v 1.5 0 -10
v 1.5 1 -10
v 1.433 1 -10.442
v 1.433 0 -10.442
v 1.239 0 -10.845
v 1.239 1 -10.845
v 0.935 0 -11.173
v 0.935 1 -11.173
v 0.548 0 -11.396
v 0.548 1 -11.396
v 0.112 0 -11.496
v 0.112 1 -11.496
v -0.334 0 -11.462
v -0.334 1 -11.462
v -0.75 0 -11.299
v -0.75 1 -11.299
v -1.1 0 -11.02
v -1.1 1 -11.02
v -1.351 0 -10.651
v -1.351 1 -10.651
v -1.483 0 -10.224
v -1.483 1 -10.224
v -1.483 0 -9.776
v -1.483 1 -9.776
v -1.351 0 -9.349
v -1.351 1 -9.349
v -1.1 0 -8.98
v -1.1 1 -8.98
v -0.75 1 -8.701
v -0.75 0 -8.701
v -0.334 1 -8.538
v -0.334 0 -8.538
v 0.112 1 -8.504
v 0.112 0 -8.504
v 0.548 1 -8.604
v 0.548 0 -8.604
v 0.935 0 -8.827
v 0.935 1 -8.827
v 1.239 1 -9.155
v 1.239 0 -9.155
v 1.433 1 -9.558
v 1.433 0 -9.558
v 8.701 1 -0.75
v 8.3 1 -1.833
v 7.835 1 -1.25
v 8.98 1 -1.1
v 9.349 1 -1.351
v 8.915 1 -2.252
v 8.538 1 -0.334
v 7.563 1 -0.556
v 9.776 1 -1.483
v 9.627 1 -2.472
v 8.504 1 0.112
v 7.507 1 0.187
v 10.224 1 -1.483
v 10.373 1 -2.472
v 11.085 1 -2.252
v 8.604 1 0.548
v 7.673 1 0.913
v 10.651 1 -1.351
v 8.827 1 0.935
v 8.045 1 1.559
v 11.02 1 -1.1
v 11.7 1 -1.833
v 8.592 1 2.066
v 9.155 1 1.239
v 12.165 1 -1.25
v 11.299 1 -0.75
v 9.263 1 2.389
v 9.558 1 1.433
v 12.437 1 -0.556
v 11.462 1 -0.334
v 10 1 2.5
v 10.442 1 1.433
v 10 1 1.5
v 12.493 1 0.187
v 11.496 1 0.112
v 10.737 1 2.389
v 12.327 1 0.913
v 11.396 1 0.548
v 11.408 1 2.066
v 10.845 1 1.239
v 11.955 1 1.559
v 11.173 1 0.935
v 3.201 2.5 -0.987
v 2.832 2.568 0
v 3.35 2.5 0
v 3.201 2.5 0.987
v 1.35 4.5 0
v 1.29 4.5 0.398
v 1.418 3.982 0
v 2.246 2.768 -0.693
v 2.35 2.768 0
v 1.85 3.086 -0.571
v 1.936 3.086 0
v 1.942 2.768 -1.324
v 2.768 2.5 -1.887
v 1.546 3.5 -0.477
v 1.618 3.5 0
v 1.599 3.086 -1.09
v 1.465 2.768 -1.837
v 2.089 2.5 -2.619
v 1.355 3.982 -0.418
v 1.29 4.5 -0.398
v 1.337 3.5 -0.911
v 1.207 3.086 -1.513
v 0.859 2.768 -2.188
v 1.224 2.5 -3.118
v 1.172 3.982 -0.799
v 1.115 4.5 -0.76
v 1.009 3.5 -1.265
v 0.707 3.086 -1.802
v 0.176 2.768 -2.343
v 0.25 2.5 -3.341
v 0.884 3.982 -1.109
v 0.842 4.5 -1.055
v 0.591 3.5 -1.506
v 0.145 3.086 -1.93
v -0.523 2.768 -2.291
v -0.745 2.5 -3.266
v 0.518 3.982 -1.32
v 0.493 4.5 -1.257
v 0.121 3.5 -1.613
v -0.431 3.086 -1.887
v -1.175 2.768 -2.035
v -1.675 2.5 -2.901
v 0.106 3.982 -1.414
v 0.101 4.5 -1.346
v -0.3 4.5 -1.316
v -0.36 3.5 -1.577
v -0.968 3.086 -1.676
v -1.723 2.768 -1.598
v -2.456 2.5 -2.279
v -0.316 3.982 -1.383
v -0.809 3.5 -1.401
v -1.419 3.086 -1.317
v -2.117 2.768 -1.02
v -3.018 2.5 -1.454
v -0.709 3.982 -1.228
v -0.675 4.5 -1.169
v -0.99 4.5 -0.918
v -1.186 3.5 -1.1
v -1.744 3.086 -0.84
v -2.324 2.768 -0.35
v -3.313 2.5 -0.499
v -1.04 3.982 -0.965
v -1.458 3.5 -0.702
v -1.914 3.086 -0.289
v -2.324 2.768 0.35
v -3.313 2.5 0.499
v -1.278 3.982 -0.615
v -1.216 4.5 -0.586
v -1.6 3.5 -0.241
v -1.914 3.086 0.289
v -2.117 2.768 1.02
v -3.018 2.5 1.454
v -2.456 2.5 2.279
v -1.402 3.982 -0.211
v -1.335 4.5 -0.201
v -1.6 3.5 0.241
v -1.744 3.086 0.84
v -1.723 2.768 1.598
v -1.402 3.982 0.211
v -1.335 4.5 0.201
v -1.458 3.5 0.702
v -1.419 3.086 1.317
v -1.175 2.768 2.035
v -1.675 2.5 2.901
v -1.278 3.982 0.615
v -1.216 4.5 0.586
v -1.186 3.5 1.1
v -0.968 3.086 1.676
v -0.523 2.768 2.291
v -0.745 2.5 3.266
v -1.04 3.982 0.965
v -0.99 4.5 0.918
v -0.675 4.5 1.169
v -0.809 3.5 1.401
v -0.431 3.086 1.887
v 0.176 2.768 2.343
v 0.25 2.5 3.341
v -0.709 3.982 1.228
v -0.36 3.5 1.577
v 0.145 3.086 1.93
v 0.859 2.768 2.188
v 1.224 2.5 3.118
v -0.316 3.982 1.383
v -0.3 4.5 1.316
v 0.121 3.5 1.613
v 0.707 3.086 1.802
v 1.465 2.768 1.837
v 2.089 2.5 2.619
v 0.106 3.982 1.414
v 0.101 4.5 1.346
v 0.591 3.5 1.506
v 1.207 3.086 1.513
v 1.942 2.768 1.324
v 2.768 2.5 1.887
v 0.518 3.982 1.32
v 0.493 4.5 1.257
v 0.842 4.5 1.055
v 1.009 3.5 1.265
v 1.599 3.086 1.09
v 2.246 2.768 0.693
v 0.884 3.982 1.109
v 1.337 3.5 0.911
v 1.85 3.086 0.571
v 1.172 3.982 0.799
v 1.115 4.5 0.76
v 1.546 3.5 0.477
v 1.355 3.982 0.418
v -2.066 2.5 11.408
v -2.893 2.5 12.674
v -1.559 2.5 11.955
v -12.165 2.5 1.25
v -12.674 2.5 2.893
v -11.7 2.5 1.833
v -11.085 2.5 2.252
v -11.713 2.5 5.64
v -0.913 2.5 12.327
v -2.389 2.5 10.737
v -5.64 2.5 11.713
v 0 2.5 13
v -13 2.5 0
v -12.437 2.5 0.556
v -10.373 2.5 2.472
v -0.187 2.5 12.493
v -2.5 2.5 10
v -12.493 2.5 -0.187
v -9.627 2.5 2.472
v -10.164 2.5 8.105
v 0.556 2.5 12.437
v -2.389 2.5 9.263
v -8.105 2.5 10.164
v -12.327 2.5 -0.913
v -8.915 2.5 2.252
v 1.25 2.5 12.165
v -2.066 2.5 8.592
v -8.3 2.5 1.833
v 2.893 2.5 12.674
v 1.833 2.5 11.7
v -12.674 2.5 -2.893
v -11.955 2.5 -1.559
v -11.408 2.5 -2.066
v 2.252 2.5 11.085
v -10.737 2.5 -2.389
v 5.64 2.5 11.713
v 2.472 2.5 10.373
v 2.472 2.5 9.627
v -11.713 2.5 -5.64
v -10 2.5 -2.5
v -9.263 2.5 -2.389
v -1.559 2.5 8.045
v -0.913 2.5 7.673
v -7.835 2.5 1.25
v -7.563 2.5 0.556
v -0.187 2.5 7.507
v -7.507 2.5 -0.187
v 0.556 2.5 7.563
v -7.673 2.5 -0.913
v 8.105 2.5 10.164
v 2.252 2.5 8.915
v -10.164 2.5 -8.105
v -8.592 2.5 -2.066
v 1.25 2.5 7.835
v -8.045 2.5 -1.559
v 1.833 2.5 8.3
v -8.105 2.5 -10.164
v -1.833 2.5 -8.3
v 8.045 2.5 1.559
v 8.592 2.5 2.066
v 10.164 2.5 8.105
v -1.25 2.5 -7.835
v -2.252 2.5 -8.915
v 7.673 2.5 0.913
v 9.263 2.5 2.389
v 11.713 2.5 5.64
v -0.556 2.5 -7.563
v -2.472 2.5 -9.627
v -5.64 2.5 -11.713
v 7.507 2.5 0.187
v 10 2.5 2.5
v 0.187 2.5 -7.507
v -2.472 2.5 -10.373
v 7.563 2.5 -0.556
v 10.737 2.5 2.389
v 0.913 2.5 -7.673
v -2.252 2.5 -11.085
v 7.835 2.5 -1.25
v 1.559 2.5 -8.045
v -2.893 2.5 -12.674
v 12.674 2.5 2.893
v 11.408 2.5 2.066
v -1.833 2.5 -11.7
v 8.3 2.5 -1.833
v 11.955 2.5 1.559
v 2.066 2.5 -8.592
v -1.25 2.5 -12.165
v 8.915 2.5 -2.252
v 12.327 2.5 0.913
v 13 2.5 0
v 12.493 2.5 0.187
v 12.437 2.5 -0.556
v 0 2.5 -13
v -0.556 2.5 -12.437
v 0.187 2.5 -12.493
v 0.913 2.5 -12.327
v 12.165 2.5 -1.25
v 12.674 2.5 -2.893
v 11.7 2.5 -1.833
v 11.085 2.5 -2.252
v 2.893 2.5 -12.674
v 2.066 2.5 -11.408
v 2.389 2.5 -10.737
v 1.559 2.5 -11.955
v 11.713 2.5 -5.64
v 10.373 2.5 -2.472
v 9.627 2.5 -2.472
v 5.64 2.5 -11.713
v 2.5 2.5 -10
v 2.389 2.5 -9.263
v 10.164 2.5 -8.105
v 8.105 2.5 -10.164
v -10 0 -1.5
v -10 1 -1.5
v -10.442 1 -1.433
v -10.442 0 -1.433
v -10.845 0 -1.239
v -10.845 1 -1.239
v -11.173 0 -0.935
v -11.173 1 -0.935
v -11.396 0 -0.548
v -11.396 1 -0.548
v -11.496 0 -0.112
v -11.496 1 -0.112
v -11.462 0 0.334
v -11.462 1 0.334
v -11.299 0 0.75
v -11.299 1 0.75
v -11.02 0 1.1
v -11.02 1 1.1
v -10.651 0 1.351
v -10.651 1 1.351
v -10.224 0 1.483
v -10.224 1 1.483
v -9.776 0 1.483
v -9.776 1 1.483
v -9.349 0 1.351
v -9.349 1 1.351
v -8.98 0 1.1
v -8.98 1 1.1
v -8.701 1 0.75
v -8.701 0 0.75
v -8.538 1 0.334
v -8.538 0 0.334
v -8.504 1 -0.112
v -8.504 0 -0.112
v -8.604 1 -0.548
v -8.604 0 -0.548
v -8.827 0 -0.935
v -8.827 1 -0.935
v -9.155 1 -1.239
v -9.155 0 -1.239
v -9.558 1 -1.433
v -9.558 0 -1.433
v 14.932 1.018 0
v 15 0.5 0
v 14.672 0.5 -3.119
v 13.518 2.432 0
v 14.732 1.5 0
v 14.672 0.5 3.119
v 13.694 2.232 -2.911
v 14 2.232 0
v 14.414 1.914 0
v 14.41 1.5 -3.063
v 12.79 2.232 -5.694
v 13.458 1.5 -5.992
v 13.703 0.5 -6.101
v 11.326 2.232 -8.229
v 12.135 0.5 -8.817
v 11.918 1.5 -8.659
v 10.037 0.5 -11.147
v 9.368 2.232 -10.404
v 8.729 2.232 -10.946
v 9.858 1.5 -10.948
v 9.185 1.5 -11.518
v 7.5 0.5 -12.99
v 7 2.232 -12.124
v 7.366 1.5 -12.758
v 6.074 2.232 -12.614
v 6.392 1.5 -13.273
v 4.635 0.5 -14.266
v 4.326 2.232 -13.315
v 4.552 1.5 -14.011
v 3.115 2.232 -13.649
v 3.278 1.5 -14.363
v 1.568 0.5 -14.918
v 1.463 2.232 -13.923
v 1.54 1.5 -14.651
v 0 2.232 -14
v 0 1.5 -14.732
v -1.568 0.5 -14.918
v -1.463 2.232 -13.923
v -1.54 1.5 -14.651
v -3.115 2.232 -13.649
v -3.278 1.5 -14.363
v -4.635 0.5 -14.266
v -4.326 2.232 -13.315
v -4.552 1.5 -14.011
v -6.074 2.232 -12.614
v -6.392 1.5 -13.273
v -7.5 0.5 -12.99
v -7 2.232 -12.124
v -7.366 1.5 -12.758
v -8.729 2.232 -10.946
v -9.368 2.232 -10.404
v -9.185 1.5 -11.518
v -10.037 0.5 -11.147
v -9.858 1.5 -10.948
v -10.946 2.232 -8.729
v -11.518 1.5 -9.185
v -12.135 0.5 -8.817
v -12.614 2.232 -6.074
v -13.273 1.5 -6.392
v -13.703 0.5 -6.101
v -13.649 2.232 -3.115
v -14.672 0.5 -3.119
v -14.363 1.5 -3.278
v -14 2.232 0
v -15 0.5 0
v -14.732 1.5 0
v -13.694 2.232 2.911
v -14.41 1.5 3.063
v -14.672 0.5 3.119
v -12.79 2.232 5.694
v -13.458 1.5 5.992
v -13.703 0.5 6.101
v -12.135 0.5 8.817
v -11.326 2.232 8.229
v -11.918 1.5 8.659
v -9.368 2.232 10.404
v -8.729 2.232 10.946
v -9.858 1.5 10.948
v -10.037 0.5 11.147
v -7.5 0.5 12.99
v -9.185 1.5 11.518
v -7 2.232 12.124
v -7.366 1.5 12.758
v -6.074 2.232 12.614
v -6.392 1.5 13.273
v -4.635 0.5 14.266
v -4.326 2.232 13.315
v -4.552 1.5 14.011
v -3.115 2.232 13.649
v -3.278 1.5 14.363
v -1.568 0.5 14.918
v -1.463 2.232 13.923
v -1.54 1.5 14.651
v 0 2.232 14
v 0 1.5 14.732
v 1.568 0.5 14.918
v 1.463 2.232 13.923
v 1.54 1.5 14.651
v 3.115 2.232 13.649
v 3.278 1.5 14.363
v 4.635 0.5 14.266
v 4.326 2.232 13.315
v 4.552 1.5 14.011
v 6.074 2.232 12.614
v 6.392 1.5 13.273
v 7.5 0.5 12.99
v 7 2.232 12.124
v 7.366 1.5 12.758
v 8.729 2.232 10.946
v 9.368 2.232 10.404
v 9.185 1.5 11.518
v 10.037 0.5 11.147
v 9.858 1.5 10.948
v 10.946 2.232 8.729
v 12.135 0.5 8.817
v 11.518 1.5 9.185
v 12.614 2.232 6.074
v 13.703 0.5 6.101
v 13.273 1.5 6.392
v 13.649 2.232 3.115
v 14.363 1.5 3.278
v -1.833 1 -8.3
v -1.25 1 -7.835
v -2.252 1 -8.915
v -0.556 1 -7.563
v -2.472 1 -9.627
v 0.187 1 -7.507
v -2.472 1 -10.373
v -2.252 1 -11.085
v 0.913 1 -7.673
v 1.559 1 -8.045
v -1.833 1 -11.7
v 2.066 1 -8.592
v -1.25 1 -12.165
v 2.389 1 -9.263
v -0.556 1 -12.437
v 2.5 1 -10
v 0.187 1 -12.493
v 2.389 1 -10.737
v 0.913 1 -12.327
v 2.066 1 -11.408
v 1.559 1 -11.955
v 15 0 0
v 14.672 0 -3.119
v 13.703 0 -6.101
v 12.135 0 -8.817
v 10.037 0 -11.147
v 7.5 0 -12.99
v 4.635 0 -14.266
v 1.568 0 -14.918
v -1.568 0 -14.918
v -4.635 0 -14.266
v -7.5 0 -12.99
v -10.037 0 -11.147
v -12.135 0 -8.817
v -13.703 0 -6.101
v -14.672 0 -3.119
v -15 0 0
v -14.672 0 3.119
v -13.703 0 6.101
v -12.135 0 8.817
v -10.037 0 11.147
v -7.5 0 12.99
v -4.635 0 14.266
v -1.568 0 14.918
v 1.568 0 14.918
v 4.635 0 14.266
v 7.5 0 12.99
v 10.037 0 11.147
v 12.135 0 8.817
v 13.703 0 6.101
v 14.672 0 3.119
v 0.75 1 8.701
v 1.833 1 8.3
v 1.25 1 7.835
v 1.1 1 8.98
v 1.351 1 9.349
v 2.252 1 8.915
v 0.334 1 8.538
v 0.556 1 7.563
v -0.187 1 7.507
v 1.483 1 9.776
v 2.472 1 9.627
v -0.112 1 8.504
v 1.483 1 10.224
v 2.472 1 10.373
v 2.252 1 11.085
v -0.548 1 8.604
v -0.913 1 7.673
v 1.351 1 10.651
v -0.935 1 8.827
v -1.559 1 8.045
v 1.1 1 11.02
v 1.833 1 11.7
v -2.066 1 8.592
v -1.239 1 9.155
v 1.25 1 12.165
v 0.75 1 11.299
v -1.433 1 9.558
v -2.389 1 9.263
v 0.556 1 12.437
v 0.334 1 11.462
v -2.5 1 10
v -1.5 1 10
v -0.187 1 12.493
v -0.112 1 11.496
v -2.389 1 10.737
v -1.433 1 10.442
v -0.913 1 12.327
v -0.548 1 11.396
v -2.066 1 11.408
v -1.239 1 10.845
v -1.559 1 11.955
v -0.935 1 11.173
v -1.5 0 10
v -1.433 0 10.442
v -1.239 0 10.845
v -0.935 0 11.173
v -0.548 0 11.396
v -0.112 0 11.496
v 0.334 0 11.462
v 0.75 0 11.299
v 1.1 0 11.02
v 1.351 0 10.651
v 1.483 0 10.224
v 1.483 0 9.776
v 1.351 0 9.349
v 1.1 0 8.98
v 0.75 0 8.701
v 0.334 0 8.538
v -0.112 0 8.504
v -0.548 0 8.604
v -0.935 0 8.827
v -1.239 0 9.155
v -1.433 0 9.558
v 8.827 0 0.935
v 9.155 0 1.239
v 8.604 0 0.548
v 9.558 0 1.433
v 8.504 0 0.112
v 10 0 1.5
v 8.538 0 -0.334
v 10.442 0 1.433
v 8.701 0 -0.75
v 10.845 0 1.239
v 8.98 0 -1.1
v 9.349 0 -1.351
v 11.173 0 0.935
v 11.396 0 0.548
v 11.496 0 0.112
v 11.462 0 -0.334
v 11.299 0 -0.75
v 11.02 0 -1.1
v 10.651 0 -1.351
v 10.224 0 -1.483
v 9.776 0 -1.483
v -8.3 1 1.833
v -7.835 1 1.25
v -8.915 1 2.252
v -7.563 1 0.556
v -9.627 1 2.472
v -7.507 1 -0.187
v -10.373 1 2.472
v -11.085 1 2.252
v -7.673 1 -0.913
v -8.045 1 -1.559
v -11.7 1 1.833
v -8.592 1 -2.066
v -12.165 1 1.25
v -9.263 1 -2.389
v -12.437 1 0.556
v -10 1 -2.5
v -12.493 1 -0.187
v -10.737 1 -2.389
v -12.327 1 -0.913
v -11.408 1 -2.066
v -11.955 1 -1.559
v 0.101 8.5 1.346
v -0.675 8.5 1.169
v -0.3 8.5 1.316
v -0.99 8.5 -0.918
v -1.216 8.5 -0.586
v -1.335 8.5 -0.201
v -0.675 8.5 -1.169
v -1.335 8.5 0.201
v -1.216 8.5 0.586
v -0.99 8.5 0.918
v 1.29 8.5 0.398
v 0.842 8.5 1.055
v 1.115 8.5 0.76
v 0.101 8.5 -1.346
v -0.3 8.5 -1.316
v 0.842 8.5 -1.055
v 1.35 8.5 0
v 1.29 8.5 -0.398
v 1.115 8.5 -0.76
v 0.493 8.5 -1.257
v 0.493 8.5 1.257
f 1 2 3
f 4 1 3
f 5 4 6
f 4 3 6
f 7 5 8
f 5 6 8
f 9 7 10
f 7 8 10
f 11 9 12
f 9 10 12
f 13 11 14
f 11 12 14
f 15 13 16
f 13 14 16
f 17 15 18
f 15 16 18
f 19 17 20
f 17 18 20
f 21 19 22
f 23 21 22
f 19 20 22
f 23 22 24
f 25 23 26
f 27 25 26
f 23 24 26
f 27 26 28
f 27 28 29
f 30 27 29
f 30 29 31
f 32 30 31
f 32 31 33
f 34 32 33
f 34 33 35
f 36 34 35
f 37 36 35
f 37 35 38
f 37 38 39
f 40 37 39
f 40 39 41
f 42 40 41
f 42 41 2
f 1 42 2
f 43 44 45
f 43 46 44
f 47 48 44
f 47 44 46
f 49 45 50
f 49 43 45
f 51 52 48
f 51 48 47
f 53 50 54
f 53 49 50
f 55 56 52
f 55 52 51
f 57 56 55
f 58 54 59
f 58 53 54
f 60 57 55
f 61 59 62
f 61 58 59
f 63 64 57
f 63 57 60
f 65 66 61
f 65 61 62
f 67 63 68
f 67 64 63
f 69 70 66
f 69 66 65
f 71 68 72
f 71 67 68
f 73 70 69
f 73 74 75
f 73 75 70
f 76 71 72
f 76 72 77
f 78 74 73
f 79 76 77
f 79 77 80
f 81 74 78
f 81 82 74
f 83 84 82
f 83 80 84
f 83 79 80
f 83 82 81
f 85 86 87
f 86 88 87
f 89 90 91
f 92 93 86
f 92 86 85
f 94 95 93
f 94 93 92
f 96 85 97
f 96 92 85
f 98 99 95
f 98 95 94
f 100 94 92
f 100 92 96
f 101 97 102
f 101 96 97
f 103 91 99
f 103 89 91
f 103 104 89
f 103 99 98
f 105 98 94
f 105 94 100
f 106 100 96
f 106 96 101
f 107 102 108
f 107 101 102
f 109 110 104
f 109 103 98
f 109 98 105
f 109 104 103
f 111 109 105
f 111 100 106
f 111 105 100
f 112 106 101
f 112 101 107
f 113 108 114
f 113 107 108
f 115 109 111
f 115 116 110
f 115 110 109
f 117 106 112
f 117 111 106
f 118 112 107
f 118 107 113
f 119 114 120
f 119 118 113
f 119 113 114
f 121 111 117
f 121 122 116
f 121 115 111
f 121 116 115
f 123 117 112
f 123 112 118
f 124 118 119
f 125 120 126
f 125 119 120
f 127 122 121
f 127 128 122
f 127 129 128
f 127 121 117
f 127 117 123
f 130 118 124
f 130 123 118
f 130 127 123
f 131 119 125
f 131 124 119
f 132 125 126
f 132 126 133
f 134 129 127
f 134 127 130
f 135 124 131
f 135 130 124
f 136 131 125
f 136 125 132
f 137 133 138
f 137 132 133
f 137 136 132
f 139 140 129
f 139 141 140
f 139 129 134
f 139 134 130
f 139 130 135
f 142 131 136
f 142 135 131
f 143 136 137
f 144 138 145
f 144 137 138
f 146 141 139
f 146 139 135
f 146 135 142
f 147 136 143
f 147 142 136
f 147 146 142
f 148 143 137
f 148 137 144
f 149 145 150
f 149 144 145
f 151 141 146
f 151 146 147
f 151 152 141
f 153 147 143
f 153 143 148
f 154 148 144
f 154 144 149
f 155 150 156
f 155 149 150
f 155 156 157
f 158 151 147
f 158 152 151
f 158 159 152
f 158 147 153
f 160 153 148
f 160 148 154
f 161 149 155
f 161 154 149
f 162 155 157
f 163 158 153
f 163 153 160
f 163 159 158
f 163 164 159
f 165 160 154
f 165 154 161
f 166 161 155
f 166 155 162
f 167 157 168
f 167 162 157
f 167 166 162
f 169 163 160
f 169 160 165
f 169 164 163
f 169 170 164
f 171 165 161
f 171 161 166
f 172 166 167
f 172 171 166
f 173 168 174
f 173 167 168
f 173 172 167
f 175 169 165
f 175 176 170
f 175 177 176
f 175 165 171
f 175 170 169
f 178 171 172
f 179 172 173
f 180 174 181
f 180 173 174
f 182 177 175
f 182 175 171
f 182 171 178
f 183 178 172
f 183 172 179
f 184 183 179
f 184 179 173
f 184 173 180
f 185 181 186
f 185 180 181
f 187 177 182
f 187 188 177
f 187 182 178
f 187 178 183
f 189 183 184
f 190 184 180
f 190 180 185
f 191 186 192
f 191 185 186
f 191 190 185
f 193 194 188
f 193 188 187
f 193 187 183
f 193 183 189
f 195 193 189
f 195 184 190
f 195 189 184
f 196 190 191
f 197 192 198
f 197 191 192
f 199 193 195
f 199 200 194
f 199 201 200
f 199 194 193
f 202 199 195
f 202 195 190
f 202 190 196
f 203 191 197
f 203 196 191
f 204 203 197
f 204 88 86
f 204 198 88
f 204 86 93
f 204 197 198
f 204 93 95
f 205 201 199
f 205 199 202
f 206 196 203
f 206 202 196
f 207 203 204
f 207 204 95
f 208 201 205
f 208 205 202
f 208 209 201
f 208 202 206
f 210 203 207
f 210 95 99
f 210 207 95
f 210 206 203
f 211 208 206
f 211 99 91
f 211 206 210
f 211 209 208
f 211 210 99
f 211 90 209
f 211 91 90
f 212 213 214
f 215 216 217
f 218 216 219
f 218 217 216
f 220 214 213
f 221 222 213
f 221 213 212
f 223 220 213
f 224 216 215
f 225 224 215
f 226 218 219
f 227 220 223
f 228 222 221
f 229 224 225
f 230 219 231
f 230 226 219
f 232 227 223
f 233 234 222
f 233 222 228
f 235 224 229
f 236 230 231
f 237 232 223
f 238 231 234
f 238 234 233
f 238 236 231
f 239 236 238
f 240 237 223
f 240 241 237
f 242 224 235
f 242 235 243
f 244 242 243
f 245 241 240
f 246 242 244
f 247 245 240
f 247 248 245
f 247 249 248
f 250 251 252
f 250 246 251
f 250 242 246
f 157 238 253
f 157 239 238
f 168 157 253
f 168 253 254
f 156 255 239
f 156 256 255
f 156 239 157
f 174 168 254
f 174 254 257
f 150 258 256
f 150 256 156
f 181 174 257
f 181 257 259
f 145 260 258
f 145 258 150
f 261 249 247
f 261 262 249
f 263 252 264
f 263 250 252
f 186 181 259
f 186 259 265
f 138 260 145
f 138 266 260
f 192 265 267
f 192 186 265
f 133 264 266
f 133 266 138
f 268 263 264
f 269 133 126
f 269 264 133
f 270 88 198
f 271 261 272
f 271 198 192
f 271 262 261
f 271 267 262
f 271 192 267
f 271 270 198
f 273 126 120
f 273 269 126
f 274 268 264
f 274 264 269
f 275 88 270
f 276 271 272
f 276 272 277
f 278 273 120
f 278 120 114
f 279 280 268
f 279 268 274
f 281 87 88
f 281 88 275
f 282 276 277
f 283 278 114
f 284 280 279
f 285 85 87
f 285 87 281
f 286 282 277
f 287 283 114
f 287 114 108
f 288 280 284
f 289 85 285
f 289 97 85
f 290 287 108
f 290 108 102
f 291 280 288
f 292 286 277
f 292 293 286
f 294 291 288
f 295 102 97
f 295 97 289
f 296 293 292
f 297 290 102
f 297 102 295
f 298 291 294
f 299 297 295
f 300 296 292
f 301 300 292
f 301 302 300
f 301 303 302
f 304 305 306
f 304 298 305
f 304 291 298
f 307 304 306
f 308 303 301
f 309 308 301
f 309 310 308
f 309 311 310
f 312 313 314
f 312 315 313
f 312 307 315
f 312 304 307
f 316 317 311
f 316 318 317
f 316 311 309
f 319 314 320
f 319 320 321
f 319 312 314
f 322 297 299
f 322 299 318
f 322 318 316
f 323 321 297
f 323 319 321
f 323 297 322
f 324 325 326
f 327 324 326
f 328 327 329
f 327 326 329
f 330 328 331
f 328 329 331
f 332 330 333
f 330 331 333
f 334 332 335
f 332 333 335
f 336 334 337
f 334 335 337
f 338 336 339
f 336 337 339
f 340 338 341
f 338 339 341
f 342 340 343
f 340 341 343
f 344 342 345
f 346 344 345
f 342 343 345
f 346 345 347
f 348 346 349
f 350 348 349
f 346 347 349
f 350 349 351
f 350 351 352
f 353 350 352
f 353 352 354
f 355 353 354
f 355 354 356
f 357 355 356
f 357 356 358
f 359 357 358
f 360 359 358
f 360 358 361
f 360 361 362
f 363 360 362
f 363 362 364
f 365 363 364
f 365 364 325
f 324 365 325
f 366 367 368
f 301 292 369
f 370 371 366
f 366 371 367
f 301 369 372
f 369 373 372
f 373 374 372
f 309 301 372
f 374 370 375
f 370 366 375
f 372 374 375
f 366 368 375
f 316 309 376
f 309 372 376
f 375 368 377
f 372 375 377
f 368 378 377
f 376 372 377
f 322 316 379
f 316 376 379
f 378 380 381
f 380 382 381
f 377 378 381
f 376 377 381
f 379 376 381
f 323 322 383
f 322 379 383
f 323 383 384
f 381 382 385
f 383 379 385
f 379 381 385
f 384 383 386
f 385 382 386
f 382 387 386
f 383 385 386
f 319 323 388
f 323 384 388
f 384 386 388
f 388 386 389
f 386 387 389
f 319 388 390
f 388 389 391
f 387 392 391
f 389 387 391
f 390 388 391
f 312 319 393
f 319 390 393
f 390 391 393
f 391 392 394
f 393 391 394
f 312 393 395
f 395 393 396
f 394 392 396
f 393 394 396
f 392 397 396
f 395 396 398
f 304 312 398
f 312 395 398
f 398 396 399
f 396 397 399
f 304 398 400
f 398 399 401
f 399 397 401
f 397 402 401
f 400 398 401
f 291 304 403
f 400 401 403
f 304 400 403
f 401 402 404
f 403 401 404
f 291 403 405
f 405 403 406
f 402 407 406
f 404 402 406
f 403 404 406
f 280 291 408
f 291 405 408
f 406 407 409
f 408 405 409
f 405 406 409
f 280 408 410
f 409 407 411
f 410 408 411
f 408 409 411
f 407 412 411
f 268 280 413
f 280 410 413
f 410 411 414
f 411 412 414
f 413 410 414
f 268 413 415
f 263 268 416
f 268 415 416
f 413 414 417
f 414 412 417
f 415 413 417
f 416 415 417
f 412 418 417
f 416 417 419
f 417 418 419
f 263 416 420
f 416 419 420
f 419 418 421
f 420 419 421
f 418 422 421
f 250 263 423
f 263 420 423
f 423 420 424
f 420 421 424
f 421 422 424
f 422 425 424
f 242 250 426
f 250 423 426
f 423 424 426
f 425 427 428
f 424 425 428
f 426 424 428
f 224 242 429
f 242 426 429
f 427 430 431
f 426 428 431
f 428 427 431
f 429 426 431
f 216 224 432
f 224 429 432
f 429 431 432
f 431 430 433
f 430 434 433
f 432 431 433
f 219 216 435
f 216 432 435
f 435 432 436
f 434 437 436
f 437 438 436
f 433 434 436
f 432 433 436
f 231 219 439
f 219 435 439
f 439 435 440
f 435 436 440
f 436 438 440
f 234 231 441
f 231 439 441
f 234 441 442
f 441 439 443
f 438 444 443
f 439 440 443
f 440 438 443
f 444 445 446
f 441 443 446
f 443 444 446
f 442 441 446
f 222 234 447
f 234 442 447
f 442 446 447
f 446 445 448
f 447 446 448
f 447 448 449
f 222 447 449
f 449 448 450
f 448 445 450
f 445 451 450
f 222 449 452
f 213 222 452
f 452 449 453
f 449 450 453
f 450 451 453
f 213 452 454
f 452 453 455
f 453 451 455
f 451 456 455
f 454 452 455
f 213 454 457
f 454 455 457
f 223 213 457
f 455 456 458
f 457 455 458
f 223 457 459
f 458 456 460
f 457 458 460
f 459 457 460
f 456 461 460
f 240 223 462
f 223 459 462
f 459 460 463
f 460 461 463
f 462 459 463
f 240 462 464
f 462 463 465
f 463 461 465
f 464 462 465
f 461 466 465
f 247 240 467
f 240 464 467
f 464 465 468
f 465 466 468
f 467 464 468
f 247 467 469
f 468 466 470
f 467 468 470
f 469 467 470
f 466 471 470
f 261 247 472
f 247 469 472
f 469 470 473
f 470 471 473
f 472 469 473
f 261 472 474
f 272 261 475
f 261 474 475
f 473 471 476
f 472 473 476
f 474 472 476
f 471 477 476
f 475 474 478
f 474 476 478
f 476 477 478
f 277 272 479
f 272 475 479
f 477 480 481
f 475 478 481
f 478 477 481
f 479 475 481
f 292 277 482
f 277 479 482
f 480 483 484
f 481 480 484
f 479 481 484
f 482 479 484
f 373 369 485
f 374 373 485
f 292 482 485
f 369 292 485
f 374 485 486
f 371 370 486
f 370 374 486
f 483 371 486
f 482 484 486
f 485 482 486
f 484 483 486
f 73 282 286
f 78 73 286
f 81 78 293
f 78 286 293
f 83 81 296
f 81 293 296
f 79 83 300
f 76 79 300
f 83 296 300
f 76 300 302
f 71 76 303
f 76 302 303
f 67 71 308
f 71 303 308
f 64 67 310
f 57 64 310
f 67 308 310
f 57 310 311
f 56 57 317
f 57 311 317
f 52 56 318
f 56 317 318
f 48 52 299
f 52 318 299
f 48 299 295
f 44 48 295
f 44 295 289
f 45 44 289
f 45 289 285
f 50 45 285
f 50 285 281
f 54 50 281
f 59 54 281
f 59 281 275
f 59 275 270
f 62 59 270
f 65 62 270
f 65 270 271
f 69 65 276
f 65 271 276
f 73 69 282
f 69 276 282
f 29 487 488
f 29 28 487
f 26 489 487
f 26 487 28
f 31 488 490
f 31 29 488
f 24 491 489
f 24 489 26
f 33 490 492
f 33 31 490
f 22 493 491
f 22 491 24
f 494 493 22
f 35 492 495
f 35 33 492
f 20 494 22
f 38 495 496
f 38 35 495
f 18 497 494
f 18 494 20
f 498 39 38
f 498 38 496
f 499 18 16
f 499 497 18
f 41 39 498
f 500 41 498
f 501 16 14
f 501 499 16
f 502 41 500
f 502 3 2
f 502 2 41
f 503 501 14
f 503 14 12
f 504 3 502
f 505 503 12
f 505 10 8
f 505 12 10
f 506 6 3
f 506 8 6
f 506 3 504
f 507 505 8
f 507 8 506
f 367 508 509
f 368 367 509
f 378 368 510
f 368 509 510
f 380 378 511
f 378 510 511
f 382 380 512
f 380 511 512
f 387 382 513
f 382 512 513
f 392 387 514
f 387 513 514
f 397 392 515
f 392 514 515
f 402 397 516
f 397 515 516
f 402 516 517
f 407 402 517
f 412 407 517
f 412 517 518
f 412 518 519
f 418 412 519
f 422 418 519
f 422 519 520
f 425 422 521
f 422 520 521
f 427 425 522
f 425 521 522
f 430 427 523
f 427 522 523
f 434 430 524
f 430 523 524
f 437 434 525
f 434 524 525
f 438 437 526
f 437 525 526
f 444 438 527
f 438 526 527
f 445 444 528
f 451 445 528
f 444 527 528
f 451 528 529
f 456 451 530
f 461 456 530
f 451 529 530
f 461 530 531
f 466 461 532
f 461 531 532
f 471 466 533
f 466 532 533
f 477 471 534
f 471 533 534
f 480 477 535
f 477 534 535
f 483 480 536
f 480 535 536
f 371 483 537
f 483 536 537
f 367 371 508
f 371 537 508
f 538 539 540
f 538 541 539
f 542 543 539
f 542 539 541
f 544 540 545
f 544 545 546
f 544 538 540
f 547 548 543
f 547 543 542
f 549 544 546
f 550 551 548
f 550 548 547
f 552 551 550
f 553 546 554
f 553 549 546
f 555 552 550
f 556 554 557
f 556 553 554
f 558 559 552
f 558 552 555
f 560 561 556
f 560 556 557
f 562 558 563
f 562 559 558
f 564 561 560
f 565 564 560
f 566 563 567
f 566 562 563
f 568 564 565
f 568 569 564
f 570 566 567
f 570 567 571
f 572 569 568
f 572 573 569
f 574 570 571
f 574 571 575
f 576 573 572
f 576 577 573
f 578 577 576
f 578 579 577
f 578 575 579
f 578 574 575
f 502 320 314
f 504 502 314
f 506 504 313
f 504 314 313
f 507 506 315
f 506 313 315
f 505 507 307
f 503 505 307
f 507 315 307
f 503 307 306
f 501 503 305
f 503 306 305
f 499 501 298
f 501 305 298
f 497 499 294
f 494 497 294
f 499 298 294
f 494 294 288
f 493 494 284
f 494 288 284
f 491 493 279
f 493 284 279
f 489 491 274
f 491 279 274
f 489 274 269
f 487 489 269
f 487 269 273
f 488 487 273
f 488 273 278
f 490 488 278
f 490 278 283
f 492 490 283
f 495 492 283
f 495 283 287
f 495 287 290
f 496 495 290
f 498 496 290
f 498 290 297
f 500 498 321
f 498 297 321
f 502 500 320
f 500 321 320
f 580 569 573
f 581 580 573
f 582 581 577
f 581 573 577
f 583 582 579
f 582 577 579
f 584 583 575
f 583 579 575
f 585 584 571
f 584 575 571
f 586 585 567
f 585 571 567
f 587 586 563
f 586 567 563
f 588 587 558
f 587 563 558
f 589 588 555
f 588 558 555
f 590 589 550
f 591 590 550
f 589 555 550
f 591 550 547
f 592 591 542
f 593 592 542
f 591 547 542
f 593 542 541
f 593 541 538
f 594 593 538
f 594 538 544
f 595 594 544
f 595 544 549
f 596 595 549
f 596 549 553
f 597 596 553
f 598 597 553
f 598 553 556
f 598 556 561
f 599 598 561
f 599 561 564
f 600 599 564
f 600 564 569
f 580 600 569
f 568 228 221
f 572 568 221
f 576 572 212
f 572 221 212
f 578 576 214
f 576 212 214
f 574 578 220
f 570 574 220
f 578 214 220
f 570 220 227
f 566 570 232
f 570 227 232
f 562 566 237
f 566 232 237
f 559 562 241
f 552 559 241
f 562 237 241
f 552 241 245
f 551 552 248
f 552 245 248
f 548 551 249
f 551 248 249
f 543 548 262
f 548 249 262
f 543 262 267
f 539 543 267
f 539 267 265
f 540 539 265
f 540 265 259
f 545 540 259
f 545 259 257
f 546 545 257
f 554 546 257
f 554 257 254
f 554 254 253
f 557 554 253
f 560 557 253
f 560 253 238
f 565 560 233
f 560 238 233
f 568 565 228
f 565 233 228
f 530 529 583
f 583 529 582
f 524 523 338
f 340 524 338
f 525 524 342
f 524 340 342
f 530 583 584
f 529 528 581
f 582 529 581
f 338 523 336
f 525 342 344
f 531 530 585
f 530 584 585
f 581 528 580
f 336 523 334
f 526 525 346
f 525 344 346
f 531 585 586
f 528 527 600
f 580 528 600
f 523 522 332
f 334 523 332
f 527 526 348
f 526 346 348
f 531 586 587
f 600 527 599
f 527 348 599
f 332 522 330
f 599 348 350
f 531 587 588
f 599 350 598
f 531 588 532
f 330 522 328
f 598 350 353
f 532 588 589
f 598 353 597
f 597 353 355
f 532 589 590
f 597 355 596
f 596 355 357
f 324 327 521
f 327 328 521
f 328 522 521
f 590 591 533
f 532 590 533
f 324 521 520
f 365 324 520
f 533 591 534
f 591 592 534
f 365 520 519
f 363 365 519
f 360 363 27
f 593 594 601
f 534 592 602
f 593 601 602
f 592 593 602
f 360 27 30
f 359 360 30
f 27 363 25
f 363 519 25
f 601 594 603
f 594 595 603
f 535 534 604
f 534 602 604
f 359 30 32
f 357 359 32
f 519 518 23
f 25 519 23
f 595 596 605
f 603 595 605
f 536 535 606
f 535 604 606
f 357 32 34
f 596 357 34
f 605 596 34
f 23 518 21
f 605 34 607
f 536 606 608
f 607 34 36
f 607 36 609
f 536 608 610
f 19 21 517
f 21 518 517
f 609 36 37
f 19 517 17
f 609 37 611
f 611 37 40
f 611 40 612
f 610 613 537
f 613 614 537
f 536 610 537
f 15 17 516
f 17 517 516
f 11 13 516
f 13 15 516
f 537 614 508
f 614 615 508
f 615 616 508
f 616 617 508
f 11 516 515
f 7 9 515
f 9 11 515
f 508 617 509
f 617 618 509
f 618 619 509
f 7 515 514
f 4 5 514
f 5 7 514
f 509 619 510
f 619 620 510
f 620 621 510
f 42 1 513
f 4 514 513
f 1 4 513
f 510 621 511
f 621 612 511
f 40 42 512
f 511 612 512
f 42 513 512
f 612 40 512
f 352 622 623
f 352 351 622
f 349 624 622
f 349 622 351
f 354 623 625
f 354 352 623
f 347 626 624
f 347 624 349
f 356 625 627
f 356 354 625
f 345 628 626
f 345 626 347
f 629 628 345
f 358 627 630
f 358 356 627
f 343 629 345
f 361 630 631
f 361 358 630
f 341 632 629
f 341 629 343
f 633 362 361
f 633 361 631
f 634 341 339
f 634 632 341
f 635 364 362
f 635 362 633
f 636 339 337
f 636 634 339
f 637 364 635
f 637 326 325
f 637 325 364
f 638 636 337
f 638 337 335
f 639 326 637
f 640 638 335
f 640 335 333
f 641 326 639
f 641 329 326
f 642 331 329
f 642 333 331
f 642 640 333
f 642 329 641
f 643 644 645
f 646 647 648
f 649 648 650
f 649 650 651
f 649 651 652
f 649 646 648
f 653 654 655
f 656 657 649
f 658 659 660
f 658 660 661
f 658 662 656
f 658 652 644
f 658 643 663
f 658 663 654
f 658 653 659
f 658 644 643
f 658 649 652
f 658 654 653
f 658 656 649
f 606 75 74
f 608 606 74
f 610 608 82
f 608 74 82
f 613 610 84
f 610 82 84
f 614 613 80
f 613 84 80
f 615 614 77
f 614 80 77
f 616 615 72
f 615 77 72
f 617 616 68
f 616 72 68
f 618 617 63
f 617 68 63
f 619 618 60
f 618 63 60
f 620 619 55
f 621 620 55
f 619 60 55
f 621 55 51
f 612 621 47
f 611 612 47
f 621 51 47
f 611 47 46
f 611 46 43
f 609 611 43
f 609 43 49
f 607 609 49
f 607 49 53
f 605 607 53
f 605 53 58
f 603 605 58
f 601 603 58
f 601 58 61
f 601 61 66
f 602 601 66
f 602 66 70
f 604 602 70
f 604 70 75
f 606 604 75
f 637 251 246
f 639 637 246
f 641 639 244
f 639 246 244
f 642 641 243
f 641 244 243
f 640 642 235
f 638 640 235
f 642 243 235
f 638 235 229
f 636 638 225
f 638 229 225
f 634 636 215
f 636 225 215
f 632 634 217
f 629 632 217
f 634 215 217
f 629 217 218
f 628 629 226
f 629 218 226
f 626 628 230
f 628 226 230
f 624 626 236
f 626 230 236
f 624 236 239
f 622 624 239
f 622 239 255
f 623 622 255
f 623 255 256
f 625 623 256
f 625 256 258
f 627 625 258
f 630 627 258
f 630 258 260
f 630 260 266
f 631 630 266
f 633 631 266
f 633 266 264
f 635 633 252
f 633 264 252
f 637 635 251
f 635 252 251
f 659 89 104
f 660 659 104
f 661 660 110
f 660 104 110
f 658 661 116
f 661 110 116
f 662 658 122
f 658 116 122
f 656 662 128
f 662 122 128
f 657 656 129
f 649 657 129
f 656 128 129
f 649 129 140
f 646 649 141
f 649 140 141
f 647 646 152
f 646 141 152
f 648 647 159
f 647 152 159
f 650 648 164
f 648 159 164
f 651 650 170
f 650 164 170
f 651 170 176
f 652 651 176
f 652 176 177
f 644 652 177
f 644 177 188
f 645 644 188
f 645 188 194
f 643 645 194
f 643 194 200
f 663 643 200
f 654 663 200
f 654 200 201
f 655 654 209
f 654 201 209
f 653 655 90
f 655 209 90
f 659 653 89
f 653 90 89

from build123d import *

# Parameters (mm, degrees)
SKETCH1_R           = 15
BOSS_EXTRUDE1_DEPTH = 2.5
SKETCH2_R           = 1.5
CUT_EXTRUDE1_DEPTH  = 3.5
SKETCH4_R           = 2.5
CUT_EXTRUDE2_DEPTH  = 1.5
CIRPATTERN1_COUNT   = 4
SKETCH3_R           = 1.35
BOSS_EXTRUDE2_DEPTH = 6
FILLET2_R           = 2
FILLET3_R           = 2


with BuildPart() as part:
    # Sketch1 → Boss-Extrude1 (new body)
    with BuildSketch(Plane(origin=(0, 0, 0), x_dir=(1, 0, 0), z_dir=(0, 1, 0))):
        Circle(SKETCH1_R)
    extrude(amount=BOSS_EXTRUDE1_DEPTH)

    # Sketch2 → Cut-Extrude1 (cut, through all)
    with BuildSketch(Plane(origin=(0, 2.5, 0), x_dir=(1, 0, 0), z_dir=(0, 1, 0))):
        with Locations((0, 10)):
            Circle(SKETCH2_R)
    cut_extrude1 = extrude(amount=-CUT_EXTRUDE1_DEPTH, mode=Mode.SUBTRACT)

    # Sketch4 → Cut-Extrude2 (cut)
    with BuildSketch(Plane(origin=(0, 2.5, 0), x_dir=(1, 0, 0), z_dir=(0, 1, 0))):
        with Locations((0, 10)):
            Circle(SKETCH4_R)
    cut_extrude2 = extrude(amount=-CUT_EXTRUDE2_DEPTH, mode=Mode.SUBTRACT)

    # CirPattern1: Cut-Extrude1, Cut-Extrude2 ×4 about axis
    cirpattern1_axis = Axis((0, 0, 0), (0, 1, 0))
    for i in range(1, CIRPATTERN1_COUNT):
        add(cut_extrude1.rotate(cirpattern1_axis, i * 360 / CIRPATTERN1_COUNT), mode=Mode.SUBTRACT)
        add(cut_extrude2.rotate(cirpattern1_axis, i * 360 / CIRPATTERN1_COUNT), mode=Mode.SUBTRACT)

    # Sketch3 → Boss-Extrude2 (add)
    with BuildSketch(Plane(origin=(0, 2.5, 0), x_dir=(1, 0, 0), z_dir=(0, 1, 0))):
        Circle(SKETCH3_R)
    extrude(amount=BOSS_EXTRUDE2_DEPTH)

    # Fillet2
    fillet2_edges = [part.edges().sort_by_distance(p)[0] for p in [
        (-1.35, 2.5, 0),
    ]]
    fillet(fillet2_edges, radius=FILLET2_R)

    # Fillet3
    fillet3_edges = [part.edges().sort_by_distance(p)[0] for p in [
        (-15, 2.5, 0),
    ]]
    fillet(fillet3_edges, radius=FILLET3_R)


solid = part.part
